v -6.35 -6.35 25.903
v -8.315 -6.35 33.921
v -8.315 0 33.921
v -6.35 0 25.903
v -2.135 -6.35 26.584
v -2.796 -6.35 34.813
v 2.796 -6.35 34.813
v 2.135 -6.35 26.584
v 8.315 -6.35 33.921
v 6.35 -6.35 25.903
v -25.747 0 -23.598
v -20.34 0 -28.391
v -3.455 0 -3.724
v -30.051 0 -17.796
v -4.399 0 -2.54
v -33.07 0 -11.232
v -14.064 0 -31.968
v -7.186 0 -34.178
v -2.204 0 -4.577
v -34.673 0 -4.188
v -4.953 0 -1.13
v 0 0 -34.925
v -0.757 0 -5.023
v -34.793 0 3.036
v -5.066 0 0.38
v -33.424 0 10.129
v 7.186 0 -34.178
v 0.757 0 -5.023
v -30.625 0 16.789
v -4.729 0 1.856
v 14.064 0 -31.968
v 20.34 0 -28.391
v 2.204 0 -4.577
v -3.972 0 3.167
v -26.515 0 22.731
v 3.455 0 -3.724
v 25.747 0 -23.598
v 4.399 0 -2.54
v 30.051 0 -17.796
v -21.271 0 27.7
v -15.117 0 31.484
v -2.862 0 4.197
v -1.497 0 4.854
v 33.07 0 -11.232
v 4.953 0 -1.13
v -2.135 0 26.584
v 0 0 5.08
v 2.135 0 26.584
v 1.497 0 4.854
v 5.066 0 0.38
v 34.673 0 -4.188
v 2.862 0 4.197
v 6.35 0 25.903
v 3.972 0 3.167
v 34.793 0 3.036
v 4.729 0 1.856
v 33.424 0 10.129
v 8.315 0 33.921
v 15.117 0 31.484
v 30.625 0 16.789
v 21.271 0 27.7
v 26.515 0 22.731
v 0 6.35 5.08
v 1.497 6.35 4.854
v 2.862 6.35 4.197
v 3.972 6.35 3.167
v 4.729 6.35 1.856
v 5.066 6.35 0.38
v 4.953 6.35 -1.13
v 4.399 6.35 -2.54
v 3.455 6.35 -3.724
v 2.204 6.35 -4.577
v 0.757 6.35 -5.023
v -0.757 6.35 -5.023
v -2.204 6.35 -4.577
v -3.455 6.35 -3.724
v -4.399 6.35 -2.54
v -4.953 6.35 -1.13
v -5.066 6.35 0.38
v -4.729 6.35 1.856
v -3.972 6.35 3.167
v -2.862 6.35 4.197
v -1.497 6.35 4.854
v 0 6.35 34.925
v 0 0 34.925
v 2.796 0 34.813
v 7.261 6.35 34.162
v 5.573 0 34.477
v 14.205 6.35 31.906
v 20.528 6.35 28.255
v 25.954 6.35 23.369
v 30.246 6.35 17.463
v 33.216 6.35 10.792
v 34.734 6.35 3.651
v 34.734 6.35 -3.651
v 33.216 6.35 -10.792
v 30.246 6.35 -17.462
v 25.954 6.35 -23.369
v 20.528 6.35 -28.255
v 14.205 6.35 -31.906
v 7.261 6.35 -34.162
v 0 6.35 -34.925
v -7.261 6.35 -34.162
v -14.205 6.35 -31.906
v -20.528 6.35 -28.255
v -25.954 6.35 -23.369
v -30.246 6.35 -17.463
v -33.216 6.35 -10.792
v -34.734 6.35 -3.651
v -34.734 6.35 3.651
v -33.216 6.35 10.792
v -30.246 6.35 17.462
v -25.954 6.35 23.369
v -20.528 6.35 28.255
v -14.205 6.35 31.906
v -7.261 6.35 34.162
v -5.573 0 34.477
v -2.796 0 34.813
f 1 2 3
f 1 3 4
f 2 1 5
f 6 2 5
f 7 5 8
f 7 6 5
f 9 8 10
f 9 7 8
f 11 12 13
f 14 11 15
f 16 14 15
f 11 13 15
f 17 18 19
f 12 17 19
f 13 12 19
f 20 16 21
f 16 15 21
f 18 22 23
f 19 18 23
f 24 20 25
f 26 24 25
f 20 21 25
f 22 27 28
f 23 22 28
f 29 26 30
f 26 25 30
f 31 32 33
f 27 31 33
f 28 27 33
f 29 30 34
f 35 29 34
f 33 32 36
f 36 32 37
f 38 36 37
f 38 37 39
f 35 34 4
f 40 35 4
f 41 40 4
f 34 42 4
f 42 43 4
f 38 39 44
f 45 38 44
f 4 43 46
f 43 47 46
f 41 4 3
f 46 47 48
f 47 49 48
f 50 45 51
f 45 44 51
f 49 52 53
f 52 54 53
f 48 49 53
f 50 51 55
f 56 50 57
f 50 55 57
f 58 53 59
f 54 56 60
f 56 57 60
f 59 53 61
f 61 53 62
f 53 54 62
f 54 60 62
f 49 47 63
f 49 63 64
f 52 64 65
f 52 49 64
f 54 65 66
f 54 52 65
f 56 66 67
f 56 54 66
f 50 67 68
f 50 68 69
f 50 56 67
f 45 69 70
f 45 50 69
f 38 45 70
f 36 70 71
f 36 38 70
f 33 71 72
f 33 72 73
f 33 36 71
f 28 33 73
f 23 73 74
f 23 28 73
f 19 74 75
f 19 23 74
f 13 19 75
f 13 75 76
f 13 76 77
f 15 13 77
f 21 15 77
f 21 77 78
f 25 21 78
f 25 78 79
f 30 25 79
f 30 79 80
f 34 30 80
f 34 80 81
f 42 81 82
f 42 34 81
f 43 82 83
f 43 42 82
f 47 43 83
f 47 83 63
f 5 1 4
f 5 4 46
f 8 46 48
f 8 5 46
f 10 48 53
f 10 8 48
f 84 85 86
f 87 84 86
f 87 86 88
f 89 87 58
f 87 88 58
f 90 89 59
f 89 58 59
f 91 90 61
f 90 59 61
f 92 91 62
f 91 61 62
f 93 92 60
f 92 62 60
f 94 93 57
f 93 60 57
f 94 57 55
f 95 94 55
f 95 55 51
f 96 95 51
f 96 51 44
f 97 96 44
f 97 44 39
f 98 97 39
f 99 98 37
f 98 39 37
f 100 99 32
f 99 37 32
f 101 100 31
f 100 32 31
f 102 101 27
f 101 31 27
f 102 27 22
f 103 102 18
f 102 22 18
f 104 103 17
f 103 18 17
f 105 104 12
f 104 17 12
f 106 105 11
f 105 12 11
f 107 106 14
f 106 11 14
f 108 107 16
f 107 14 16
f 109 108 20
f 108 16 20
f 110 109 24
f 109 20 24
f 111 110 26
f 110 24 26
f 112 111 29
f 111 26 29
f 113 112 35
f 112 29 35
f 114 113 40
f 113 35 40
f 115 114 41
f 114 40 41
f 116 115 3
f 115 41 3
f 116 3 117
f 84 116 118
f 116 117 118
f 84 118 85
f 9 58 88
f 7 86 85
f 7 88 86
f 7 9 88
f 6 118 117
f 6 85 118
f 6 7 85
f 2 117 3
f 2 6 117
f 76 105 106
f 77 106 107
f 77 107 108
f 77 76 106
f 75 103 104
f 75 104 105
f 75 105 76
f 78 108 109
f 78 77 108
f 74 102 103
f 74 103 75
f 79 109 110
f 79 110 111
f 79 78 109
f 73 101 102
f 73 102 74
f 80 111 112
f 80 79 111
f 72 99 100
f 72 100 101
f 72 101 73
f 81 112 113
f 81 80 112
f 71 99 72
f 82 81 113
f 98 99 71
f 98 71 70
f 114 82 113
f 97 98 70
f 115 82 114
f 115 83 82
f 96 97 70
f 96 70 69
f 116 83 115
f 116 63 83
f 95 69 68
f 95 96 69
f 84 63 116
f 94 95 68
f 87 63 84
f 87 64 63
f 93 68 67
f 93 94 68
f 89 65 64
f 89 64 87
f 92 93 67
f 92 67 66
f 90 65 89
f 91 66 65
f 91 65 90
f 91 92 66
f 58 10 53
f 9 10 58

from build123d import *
from build123d.topology import SkipClean

# Parameters (mm, degrees)
SKETCH2_R           = 34.925
SKETCH2_R_2         = 5.08
BOSS_EXTRUDE1_DEPTH = 6.35
BOSS_EXTRUDE2_START = 6.35
BOSS_EXTRUDE2_DEPTH = 6.35


with BuildPart() as part:
    # Sketch2 → Boss-Extrude1 (new body)
    with BuildSketch(Plane(origin=(0, 0, 0), x_dir=(1, 0, 0), z_dir=(0, 1, 0))):
        with Locations(Location((0, 0, 0), (0, 0, 270))):
            Circle(SKETCH2_R)
        with Locations(Location((0, 0, 0), (0, 0, 270))):
            Circle(SKETCH2_R_2, mode=Mode.SUBTRACT)
    extrude(amount=BOSS_EXTRUDE1_DEPTH)

    # Sketch3 → Boss-Extrude2 (add)
    with SkipClean():  # the faces are left unmerged after this step: merging them gives an invalid solid
        with BuildSketch(Plane.XZ.offset(BOSS_EXTRUDE2_START)):
            with BuildLine():
                Line((6.35, 25.903019129), (8.31547619, 33.920620288))
                ThreePointArc((8.31547619, 33.920620288), (0, 34.925), (-8.31547619, 33.920620288))
                Line((-8.31547619, 33.920620288), (-6.35, 25.903019129))
                ThreePointArc((-6.35, 25.903019129), (0, 26.67), (6.35, 25.903019129))
            make_face()
        extrude(amount=-BOSS_EXTRUDE2_DEPTH)


solid = part.part
